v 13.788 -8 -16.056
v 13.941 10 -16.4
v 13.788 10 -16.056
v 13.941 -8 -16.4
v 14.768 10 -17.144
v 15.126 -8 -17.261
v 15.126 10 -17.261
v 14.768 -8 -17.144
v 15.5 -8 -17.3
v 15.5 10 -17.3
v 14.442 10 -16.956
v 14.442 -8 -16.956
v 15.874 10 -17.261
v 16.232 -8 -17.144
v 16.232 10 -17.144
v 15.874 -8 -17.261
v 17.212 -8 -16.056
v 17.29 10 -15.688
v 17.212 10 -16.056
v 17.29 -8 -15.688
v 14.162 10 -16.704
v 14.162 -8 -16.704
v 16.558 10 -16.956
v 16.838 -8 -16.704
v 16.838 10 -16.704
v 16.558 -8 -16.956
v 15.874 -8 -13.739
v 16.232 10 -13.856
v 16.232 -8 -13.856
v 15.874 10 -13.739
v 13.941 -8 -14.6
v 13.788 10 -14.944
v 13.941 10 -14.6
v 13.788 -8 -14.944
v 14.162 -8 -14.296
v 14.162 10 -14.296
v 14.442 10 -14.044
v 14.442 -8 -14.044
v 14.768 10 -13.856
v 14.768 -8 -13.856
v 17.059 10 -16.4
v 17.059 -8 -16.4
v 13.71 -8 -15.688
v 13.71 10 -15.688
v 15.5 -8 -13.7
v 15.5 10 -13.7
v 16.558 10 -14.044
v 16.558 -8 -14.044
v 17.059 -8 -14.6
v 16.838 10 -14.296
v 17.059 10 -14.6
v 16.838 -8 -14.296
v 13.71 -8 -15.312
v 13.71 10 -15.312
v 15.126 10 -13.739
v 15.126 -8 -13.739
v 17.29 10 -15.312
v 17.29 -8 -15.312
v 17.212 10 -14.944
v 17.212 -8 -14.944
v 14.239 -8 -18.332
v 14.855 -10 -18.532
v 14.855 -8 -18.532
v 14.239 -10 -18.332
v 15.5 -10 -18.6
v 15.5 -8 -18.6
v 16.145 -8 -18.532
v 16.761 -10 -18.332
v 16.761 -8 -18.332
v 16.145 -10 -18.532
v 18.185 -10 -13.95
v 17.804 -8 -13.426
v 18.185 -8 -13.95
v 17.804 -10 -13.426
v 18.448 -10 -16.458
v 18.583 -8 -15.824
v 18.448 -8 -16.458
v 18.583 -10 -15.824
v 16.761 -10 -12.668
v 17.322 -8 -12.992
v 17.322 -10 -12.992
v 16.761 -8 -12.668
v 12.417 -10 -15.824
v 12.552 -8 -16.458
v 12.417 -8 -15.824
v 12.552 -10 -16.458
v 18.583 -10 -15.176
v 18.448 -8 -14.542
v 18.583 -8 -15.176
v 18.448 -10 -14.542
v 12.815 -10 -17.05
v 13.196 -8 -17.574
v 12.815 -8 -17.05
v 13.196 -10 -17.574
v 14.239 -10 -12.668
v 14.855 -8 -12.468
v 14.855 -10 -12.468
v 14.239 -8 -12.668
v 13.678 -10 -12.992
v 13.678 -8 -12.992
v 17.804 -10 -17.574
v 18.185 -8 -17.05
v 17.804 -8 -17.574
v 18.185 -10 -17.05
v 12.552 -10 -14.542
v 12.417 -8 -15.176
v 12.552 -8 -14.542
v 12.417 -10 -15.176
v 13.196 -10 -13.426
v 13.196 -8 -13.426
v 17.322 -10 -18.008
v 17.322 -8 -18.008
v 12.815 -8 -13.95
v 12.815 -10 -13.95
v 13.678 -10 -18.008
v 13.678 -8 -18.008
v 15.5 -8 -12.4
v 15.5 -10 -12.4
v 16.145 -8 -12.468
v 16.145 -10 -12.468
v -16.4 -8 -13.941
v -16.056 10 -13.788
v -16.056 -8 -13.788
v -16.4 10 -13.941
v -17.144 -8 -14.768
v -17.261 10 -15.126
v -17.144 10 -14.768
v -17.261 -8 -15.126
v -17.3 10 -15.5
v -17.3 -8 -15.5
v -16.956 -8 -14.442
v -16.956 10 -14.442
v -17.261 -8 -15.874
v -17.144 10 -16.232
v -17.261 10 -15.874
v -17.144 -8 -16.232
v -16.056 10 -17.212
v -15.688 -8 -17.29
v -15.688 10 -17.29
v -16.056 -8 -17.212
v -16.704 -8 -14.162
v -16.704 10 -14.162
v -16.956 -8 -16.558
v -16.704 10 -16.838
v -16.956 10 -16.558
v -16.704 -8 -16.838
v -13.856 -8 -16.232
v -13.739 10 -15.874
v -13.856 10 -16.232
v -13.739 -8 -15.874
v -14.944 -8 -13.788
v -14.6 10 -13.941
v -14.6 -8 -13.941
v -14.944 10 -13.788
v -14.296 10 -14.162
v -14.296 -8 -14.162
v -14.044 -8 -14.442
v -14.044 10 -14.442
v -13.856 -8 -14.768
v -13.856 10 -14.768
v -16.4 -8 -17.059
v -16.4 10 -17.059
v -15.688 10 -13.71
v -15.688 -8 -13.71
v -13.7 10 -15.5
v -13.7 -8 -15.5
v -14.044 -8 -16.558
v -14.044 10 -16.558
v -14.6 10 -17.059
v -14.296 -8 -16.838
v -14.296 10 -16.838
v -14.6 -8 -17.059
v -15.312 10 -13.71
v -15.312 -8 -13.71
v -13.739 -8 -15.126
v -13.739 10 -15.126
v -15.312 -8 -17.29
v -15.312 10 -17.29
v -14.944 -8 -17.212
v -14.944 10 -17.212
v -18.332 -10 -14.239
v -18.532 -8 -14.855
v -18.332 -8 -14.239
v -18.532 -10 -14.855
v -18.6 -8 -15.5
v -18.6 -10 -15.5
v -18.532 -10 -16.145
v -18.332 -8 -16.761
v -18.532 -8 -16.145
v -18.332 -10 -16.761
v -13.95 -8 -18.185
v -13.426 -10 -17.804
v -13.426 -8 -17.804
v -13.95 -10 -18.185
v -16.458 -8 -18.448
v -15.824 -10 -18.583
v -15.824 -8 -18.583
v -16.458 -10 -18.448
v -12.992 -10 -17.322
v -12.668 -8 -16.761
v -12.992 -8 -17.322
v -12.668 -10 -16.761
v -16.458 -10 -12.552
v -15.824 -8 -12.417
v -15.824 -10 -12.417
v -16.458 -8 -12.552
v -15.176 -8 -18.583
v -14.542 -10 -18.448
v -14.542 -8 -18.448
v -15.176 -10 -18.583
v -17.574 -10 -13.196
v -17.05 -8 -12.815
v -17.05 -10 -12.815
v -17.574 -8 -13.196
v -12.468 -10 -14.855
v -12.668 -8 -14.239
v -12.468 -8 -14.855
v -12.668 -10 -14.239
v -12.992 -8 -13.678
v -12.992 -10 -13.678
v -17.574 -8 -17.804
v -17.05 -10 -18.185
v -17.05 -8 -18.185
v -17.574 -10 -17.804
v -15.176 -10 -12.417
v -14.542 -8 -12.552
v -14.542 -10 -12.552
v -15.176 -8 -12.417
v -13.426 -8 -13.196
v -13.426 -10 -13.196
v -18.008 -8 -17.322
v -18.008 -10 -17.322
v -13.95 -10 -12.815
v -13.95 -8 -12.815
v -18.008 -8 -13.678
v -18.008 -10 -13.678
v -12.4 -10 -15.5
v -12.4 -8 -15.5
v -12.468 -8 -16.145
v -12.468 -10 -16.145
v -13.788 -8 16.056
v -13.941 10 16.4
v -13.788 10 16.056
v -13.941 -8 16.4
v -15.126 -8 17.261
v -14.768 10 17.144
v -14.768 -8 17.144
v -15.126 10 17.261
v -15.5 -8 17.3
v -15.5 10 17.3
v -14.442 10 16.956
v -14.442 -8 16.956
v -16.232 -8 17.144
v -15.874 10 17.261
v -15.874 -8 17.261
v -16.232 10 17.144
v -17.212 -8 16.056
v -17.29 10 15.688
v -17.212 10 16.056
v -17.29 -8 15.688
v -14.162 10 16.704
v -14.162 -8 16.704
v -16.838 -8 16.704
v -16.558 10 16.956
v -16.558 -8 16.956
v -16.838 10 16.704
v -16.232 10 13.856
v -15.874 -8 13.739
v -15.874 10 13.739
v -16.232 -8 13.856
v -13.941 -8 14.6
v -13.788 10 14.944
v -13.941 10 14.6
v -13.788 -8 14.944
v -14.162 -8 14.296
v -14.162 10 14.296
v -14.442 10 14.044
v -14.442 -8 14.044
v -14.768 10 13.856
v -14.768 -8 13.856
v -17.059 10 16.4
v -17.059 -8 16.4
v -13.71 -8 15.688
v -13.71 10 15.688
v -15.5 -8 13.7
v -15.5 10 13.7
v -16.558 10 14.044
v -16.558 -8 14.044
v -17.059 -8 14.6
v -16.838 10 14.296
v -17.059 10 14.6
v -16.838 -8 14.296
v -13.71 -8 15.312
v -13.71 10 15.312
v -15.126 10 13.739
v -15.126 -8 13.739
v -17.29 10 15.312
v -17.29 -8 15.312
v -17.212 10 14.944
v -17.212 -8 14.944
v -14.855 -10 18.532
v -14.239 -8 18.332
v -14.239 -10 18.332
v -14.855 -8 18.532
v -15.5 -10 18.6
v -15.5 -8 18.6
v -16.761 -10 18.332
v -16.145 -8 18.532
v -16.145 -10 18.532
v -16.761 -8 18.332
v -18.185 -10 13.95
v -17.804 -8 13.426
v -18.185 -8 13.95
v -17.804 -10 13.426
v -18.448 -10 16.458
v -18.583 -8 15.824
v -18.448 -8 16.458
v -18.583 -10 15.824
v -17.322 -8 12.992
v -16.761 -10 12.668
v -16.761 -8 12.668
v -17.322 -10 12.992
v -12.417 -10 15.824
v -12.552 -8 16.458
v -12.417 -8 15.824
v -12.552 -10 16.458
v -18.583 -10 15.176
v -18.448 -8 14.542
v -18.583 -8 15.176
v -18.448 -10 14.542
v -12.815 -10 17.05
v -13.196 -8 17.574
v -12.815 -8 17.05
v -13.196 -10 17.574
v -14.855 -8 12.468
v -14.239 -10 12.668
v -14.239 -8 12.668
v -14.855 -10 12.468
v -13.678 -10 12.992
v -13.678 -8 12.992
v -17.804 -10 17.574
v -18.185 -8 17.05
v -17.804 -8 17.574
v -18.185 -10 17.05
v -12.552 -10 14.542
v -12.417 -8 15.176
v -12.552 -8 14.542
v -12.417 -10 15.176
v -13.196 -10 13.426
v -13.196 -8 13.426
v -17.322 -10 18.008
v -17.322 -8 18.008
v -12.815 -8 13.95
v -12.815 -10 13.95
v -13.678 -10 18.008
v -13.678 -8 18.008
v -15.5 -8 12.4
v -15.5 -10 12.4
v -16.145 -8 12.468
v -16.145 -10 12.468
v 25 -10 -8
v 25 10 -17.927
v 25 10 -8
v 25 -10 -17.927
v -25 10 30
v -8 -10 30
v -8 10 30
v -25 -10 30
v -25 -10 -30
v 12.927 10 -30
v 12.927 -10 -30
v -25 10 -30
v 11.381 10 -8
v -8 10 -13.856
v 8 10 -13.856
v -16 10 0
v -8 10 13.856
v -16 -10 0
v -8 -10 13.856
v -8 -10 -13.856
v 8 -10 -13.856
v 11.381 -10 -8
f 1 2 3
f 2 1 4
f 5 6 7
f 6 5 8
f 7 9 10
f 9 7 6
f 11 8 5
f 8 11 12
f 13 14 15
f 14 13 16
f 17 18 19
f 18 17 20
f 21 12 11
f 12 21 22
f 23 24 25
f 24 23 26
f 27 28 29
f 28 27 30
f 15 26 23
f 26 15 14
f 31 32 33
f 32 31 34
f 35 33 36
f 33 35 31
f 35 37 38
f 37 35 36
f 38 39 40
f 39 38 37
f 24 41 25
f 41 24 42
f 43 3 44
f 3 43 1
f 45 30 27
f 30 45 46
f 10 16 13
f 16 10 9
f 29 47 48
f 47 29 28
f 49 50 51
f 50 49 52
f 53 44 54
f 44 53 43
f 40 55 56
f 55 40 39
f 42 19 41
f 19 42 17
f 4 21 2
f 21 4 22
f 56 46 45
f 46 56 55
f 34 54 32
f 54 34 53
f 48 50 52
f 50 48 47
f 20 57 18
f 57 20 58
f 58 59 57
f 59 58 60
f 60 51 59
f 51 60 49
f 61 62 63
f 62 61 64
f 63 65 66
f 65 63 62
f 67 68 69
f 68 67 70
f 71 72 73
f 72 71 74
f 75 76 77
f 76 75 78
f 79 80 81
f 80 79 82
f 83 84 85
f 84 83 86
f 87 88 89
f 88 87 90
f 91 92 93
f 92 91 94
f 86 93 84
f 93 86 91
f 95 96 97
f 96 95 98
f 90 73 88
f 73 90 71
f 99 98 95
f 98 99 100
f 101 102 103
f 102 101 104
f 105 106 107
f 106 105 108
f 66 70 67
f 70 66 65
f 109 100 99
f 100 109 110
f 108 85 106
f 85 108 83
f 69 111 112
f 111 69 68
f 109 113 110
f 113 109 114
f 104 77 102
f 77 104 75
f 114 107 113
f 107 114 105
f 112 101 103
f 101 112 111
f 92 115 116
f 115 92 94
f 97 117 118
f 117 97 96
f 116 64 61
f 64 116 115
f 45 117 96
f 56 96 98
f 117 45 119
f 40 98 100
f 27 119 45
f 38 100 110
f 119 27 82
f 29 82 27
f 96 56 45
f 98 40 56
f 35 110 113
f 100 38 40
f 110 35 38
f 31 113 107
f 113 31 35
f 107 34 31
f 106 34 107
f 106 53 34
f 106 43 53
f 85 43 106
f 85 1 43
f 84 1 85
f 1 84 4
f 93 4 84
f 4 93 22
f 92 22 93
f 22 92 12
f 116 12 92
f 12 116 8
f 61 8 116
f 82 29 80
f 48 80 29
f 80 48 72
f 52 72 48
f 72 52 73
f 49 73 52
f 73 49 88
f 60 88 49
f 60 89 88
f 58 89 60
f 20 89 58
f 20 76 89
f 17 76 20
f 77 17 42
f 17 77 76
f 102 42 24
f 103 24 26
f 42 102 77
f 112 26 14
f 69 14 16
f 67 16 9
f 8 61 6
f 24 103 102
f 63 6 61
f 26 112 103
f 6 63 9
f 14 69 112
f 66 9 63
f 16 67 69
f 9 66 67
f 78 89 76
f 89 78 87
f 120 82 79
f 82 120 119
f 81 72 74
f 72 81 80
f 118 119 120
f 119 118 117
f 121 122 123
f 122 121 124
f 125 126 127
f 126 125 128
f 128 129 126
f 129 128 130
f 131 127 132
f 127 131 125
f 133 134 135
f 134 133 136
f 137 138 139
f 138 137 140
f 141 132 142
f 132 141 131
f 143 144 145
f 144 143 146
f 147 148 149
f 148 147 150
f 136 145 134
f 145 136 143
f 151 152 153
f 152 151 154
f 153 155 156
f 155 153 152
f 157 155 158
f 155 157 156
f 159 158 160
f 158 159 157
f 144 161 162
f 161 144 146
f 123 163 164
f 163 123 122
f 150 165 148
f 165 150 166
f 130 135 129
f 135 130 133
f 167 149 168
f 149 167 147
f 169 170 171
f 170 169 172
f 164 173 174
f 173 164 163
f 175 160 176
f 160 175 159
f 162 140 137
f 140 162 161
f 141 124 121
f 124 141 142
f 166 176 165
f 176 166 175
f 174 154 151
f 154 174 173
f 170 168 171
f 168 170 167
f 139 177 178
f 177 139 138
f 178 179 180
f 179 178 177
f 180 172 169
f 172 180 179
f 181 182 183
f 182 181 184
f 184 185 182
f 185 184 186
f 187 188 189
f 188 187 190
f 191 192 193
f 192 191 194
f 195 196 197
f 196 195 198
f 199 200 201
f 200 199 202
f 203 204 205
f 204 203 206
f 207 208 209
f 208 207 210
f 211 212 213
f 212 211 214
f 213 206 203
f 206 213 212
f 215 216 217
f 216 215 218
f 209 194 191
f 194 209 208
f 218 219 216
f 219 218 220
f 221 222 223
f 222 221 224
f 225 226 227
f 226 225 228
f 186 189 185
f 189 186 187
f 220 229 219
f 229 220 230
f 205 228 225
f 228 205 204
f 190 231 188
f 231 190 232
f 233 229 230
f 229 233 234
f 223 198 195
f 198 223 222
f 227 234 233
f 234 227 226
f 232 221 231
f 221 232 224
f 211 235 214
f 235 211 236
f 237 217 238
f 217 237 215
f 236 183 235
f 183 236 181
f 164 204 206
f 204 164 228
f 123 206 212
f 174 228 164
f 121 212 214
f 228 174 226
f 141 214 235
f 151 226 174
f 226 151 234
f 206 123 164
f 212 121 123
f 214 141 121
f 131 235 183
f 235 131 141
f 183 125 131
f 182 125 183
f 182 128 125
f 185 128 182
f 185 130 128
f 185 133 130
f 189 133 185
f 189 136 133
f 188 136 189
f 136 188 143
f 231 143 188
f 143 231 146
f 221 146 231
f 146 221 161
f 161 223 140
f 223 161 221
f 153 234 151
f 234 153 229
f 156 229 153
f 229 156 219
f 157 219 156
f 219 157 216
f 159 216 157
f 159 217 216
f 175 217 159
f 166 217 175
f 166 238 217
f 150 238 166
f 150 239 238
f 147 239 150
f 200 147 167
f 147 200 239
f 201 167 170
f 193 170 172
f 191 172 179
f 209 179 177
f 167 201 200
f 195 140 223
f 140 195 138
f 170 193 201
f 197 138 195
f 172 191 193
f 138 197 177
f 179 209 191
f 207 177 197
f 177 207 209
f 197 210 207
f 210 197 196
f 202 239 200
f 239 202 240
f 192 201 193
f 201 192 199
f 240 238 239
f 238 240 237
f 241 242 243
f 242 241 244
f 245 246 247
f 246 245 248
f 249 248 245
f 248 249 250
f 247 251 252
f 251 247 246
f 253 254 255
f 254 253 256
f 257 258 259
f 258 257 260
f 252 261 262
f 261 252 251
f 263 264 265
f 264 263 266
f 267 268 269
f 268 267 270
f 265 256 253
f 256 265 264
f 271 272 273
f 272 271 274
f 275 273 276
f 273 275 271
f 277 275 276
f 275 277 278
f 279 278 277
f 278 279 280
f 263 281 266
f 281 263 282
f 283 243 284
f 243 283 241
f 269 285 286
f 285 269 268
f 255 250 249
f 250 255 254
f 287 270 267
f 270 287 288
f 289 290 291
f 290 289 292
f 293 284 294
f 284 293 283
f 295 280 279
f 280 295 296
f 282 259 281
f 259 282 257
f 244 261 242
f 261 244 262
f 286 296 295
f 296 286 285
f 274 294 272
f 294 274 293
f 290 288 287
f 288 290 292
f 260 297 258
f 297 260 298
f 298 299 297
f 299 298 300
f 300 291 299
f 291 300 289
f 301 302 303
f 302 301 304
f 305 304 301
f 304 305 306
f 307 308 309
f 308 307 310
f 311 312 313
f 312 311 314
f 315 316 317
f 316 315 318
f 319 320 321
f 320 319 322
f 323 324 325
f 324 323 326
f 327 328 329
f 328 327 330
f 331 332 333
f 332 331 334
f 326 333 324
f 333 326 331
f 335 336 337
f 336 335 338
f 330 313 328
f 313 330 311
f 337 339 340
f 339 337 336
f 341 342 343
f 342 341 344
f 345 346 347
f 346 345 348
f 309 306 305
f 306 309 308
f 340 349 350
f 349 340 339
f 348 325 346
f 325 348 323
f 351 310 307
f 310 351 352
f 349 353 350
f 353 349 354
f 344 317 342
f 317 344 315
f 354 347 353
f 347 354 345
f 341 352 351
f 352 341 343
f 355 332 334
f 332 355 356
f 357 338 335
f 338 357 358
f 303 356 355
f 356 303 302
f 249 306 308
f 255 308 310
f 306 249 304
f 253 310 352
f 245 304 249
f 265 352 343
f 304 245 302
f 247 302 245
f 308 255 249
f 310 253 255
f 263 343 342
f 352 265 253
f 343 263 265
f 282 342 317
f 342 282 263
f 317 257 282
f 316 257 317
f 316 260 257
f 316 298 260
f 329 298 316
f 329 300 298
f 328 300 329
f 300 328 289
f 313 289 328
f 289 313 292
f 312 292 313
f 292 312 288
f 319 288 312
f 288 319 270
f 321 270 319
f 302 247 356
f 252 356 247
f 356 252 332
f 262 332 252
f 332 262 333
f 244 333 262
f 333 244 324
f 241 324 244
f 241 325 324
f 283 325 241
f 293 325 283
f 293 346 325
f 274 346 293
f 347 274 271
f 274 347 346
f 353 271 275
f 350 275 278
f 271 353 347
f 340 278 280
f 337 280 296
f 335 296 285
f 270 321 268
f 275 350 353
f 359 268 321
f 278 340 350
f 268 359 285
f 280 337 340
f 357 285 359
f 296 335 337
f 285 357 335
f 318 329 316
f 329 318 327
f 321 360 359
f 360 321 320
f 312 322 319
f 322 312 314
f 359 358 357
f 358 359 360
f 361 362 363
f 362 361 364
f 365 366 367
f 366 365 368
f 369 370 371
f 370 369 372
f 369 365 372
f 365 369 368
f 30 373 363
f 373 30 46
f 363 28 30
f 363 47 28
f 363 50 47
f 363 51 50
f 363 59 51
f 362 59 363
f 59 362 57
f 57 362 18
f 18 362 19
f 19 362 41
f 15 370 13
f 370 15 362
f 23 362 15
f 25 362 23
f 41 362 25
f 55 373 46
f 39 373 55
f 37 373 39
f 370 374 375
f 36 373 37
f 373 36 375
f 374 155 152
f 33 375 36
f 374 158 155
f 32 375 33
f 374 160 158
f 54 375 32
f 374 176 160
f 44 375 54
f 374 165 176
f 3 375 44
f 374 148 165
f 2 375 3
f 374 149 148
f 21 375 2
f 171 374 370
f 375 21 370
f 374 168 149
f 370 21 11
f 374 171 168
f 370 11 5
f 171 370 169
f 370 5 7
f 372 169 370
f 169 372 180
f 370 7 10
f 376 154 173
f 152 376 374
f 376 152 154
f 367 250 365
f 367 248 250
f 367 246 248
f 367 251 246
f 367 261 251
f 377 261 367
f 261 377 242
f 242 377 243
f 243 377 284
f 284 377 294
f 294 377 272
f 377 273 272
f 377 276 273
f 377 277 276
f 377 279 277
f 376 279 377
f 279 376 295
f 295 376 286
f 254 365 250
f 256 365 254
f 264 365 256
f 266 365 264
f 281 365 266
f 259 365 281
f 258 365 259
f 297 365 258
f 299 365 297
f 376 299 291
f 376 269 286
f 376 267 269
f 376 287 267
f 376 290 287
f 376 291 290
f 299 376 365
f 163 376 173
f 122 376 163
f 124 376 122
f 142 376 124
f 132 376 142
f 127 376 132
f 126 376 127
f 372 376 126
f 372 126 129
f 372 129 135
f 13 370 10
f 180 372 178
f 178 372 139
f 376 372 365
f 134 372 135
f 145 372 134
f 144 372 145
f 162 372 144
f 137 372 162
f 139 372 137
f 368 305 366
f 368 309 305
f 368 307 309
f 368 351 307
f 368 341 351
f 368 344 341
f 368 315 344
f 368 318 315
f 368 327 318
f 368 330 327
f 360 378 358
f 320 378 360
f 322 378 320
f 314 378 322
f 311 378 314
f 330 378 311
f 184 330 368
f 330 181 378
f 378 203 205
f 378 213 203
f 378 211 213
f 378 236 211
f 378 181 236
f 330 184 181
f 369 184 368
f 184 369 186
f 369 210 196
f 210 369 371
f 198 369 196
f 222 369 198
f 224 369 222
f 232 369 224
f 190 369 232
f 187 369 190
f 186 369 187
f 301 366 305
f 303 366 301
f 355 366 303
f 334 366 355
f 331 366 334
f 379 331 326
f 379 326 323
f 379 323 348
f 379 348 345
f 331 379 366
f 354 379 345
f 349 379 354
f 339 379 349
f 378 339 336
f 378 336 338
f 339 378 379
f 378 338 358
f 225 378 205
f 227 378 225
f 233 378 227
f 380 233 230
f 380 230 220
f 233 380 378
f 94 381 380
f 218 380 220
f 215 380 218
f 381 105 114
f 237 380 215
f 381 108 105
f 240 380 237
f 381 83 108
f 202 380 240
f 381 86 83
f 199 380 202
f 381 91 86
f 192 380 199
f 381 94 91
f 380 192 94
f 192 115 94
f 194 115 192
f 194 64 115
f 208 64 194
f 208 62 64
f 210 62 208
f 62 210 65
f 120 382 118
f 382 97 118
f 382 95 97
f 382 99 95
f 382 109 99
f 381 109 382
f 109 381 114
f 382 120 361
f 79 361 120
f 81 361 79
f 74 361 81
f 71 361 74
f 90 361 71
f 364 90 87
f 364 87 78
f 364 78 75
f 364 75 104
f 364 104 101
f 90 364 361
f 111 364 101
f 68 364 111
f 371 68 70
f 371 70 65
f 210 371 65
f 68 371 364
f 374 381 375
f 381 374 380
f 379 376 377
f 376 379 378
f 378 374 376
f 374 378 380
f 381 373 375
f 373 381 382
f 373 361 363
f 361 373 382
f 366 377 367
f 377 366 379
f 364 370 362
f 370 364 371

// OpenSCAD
module x_end_motor_attachment(
                                    width=50,
                                    height=60, 
                                    depth=20,
                                    x_offset= 10,
                                    screw_hole_size=3.6,
                                    screw_head_size=6.2,
                                    screw_head_depth=2,
                                    shaft_hole_diameter=32){
   
    difference(){  
    // main body
    cube(size = [width, depth, height], center = true);

    // motor mounting holes              
    for(i=[0:3])
        rotate([0, 90*i, 0]) {
            translate(v=[15.5, 0, 15.5]) 
                rotate(a=[-90, 0, 0]){
                    cylinder(h = 2*depth, r=screw_hole_size/2, $fn=30, center=true);
                    translate(v=[0,0, -depth/2]) 
                        cylinder(h = screw_head_depth*2, r=screw_head_size/2, $fn=30, center=true);
                }
         }
     
    // motor shaft hole
     rotate(a=[90,0,0]) 
         cylinder(h = 2*depth, r=shaft_hole_diameter/2, $fn=6, center=true);
 
     
    // material saving cutouts
    translate([width/2-shaft_hole_diameter/4, 0, height/2-shaft_hole_diameter/4]) 
        cube(size = [width, 2*depth, height], center = true);
    // corner chamfer
    chamfer_center_offset = min(width/2, height/2);
    hole_clearance = shaft_hole_diameter / 6;
    chamfer_size = (chamfer_center_offset/cos(45)-(15.5)/cos(45)-(screw_head_size/2)-hole_clearance) *2;
    translate([chamfer_center_offset, 0, -chamfer_center_offset]) 
        rotate(a=[0,45,0])
         cube(size = [chamfer_size, 2*depth, width], center = true); 

    }
   
}

x_end_motor_attachment();
